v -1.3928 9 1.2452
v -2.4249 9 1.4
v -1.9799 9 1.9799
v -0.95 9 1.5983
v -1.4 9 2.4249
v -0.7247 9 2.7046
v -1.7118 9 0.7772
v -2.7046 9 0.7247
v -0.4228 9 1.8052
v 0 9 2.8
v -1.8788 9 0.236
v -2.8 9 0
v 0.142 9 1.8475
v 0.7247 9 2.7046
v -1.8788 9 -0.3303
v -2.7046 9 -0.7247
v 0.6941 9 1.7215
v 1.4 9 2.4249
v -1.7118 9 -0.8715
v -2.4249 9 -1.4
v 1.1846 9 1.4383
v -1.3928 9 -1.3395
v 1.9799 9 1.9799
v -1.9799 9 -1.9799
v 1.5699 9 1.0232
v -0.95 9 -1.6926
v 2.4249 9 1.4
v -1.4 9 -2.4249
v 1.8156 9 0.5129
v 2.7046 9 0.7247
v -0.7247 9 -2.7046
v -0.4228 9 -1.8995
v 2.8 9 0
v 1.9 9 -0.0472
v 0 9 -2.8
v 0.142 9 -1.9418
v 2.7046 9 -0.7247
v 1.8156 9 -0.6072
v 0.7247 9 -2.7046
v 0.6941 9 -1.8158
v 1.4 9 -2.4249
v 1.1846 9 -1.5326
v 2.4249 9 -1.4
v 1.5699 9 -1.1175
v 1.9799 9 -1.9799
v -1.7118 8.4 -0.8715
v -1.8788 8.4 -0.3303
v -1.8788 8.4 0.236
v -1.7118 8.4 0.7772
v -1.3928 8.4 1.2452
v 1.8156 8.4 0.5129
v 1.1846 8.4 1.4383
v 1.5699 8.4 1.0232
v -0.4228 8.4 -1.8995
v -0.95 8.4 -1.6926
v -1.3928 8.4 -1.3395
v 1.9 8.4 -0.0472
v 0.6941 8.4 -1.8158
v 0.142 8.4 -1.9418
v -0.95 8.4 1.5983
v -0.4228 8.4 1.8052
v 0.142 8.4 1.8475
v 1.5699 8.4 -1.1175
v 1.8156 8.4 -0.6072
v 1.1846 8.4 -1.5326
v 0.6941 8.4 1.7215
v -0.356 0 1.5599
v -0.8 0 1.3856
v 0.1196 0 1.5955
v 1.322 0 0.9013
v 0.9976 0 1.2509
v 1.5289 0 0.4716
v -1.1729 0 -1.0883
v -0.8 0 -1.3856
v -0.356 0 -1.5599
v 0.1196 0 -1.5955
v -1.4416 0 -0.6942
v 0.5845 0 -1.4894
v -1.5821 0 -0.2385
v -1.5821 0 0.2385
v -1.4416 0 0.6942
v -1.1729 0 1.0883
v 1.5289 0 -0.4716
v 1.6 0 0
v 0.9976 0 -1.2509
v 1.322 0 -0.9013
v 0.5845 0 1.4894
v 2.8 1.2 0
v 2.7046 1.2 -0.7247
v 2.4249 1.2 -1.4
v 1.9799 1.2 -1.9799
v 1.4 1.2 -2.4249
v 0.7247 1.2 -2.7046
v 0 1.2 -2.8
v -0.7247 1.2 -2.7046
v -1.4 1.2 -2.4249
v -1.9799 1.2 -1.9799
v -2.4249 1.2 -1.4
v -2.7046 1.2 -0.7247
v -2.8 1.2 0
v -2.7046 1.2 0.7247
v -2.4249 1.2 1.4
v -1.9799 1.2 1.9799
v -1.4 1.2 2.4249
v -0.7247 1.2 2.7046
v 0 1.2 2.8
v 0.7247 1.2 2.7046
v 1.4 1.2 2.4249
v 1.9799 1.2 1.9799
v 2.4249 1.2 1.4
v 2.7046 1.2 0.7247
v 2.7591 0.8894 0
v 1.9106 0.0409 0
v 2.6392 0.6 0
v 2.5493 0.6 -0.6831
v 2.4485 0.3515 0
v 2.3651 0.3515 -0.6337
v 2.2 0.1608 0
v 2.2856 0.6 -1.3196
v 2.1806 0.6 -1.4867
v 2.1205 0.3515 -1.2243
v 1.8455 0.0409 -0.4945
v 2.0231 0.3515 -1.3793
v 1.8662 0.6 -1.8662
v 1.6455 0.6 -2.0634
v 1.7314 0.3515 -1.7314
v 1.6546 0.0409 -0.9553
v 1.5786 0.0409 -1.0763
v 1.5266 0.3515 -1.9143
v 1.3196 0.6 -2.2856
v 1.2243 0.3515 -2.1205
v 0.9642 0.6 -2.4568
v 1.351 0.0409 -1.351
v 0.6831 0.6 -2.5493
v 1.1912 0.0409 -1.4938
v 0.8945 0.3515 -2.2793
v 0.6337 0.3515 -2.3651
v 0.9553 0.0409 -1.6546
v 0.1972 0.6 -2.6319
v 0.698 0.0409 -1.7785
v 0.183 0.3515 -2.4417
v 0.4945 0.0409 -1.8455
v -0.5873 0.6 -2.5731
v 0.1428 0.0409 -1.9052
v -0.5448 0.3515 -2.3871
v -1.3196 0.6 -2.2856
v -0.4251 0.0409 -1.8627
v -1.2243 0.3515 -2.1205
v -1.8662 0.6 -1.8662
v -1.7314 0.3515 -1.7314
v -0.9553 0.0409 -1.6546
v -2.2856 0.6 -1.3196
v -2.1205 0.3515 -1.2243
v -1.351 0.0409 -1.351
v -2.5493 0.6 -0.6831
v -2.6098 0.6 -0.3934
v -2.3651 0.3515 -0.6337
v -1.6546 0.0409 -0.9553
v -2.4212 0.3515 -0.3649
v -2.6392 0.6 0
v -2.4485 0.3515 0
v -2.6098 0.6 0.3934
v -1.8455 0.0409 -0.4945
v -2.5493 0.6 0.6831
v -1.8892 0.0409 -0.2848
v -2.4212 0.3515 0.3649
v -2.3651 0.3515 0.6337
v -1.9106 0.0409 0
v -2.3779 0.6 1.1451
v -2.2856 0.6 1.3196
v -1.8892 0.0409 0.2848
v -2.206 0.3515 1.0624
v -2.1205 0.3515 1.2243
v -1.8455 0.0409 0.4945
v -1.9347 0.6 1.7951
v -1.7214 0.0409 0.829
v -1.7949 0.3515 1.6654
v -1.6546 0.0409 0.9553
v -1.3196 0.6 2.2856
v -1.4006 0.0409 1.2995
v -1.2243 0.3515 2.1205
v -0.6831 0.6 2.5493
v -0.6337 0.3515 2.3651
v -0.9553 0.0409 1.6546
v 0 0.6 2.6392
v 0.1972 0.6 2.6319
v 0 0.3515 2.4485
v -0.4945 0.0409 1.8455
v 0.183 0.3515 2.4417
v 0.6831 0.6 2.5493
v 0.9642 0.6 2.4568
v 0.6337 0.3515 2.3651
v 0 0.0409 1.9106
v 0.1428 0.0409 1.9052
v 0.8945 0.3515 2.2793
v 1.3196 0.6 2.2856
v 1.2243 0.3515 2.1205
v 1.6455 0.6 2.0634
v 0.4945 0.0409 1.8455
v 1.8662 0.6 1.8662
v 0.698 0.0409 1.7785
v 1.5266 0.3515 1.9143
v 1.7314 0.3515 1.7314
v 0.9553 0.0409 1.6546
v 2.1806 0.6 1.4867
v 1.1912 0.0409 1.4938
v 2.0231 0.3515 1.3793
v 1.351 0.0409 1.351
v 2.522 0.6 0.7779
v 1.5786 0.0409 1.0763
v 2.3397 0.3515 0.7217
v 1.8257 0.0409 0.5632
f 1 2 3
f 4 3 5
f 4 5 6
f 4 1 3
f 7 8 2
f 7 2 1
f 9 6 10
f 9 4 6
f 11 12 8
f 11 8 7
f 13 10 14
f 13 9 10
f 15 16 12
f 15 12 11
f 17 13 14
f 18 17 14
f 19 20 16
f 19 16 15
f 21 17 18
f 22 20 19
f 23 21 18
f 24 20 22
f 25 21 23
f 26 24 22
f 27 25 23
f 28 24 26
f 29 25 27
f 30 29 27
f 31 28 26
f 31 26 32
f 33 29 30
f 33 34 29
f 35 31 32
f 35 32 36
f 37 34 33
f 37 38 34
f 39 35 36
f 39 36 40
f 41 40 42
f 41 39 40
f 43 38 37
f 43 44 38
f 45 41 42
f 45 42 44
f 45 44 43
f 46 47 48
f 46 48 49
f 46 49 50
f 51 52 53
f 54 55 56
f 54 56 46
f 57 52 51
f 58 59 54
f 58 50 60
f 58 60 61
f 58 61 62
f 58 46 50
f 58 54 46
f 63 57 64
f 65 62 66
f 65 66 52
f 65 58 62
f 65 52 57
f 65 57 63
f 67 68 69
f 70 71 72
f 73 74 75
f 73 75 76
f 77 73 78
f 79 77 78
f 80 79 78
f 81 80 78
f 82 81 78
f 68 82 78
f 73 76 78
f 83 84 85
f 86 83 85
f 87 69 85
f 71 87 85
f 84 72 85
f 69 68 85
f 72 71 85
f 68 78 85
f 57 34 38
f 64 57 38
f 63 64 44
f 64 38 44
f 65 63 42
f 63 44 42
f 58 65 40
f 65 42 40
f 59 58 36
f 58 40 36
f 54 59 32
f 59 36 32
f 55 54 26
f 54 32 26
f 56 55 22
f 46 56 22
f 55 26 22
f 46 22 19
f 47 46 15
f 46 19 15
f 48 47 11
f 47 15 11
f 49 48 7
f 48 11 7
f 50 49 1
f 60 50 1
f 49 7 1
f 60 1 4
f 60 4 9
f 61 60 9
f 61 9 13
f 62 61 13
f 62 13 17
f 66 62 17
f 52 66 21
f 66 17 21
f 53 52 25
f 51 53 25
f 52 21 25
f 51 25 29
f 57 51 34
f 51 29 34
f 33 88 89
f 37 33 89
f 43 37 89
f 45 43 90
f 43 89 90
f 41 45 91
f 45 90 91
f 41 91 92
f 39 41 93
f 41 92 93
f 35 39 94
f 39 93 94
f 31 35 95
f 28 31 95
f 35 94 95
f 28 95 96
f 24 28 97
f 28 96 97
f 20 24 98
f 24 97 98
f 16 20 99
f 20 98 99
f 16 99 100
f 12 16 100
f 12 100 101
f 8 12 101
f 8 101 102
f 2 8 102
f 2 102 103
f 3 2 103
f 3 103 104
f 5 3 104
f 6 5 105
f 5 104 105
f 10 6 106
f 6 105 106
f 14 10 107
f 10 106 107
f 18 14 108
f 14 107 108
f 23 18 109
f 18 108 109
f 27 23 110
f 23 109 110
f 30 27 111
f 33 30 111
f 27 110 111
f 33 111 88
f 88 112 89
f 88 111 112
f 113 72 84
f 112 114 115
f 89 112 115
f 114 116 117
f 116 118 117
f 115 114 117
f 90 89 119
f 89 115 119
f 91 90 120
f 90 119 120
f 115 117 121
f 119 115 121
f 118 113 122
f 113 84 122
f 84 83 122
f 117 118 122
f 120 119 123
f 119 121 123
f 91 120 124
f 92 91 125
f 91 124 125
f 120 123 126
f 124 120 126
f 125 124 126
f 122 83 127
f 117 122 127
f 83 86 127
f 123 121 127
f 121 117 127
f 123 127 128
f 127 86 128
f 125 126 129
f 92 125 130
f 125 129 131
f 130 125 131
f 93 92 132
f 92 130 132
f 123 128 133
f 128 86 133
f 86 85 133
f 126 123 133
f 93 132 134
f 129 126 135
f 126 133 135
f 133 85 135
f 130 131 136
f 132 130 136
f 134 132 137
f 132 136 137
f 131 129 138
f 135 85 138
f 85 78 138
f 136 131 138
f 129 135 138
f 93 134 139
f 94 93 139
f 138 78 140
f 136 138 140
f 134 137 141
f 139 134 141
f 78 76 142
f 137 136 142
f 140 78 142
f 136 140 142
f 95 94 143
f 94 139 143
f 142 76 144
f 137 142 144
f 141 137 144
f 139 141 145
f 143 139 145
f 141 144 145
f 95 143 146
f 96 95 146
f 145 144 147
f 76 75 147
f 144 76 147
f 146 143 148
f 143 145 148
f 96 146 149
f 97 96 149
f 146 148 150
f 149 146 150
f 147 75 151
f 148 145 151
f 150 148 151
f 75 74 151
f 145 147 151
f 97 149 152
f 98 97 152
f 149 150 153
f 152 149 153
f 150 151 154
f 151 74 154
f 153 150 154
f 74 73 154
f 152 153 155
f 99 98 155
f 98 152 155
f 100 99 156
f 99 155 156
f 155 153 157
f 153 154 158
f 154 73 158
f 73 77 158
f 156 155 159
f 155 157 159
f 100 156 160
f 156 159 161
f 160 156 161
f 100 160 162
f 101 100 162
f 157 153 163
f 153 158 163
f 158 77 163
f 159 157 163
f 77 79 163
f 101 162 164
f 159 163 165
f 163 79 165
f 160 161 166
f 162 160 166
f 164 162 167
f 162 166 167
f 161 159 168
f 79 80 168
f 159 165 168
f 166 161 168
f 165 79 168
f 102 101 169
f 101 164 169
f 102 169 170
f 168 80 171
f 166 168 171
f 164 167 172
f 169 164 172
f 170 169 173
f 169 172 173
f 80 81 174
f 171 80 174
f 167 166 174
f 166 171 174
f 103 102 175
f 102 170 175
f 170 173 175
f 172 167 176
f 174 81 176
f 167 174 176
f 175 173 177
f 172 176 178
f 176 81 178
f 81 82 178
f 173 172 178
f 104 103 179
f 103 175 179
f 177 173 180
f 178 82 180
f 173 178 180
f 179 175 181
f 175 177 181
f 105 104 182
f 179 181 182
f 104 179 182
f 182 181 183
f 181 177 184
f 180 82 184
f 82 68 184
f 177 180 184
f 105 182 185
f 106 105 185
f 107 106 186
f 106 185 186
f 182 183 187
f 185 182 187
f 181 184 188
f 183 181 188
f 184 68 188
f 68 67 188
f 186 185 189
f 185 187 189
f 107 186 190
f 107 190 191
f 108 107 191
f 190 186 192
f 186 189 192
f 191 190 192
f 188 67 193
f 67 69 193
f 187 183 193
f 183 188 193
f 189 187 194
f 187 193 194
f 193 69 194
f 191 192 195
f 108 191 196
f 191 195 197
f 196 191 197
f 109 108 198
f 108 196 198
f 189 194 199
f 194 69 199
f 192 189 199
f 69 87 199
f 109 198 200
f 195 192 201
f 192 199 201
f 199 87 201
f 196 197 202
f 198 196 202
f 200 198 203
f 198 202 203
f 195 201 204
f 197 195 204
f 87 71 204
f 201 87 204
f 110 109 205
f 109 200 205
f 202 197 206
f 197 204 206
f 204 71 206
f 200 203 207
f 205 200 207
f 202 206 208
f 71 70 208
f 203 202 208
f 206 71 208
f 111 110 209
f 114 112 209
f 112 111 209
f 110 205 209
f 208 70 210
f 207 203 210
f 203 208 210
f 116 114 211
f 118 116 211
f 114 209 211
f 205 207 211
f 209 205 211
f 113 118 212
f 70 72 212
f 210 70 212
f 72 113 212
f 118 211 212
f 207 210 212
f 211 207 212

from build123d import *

# Parameters (mm, degrees)
SKETCH_1_R          = 2.8
EXTRUDE_1_DEPTH     = 9
SKETCH_2_R          = 1.9
CUT_EXTRUDE_1_DEPTH = 0.6
FILLET_1_R          = 1.2


with BuildPart() as part:
    # Эскиз1 → Бобышка-Вытянуть1 (new body)
    with BuildSketch(Plane(origin=(0, 0, 0), x_dir=(1, 0, 0), z_dir=(0, 1, 0))):
        Circle(SKETCH_1_R)
    extrude(amount=EXTRUDE_1_DEPTH)

    # Эскиз2 → Вырез-Вытянуть1 (cut)
    with BuildSketch(Plane(origin=(0, 9, 0), x_dir=(1, 0, 0), z_dir=(0, 1, 0))):
        with Locations((0, 0.047154172)):
            Circle(SKETCH_2_R)
    extrude(amount=-CUT_EXTRUDE_1_DEPTH, mode=Mode.SUBTRACT)

    # Скругление1
    fillet_1_edges = [part.edges().sort_by_distance(p)[0] for p in [
        (-2.8, 0, 0),
    ]]
    fillet(fillet_1_edges, radius=FILLET_1_R)


solid = part.part
